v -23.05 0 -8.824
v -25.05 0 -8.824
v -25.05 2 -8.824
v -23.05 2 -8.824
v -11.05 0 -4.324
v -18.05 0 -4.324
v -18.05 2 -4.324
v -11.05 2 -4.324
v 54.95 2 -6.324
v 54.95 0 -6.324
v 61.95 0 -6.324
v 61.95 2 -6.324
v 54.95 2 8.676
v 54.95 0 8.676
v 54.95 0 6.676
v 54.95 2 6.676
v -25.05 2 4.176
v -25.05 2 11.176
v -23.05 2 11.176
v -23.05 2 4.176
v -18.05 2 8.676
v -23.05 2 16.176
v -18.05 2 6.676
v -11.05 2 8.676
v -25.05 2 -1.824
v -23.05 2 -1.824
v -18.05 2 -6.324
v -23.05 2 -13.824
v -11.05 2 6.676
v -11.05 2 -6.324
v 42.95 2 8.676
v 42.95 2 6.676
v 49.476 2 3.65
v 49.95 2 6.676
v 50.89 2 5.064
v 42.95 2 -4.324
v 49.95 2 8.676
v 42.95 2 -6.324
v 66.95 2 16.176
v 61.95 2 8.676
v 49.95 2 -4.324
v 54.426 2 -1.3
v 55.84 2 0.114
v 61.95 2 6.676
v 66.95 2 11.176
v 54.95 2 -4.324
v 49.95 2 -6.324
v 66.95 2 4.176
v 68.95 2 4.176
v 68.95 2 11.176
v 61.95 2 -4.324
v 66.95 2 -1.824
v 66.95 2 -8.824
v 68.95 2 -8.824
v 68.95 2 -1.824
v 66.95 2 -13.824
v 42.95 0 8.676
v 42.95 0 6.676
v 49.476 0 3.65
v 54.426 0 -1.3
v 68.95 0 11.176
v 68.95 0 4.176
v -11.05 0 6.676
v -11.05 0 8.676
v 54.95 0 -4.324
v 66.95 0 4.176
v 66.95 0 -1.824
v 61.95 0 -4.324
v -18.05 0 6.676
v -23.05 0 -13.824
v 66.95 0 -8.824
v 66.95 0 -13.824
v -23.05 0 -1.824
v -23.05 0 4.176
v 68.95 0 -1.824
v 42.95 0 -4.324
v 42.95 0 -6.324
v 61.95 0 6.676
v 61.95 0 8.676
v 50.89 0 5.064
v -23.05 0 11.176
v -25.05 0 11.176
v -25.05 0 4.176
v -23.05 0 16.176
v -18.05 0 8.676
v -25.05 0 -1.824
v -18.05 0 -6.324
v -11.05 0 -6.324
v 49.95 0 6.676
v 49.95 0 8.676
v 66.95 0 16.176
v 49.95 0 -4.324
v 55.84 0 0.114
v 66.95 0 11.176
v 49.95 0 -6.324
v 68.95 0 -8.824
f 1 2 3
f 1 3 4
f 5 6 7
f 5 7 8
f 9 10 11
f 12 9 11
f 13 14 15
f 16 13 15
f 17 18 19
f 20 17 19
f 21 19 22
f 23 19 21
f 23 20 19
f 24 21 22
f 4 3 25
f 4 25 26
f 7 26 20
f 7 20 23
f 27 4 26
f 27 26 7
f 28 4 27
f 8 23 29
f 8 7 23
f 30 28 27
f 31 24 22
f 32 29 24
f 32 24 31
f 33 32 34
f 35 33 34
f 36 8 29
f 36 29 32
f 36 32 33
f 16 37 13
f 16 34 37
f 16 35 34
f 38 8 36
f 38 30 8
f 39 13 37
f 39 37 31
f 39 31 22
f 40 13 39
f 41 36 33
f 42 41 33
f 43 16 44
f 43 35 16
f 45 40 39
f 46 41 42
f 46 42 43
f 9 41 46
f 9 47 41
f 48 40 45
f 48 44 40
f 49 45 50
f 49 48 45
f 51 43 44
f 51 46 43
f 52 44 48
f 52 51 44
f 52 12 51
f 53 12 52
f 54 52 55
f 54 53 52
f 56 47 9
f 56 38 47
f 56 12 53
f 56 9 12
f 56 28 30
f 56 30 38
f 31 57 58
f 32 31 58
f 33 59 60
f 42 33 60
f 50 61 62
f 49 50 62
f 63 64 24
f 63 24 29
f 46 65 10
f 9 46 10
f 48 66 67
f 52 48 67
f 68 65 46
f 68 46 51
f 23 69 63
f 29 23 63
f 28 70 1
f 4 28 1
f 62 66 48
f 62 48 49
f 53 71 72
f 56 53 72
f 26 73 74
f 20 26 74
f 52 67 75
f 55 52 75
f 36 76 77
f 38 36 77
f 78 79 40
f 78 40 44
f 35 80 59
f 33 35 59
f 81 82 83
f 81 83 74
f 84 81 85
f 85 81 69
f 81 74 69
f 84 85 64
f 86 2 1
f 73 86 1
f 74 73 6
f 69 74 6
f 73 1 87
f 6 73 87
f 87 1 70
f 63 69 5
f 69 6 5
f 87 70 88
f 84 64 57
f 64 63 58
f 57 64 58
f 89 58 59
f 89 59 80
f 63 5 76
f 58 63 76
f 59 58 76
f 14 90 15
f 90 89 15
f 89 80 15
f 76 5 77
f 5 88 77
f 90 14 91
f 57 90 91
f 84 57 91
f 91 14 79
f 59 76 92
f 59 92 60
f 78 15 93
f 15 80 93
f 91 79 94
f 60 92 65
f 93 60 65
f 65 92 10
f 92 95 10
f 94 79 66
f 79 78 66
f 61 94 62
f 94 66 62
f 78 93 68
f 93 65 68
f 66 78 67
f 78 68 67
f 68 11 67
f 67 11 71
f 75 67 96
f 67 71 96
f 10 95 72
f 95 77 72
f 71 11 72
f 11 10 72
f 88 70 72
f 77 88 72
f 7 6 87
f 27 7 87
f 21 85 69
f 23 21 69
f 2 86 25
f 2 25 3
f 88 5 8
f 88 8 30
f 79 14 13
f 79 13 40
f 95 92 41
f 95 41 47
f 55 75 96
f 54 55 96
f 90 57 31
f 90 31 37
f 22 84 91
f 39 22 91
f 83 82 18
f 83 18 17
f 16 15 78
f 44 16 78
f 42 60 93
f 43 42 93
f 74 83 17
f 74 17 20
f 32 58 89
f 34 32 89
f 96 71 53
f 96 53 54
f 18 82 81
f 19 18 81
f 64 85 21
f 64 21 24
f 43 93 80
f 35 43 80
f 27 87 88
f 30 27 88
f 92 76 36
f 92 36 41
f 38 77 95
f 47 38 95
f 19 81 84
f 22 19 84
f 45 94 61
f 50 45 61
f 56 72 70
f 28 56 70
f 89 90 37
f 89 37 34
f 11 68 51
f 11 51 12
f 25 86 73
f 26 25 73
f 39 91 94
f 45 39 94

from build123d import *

# Parameters (mm, degrees)
SKETCH1_W           = 2
SKETCH1_H           = 7
SKETCH1_W_2         = 7
SKETCH1_H_2         = 2
BOSS_EXTRUDE1_DEPTH = 2


with BuildPart() as part:
    # Sketch1 → Boss-Extrude1 (new body)
    # profile 1 of 6: a face of its own
    with BuildSketch(Plane(origin=(0, 0, 0), x_dir=(1, 0, 0), z_dir=(0, 1, 0))):
        with Locations((-24.050101389, 5.323848353)):
            Rectangle(SKETCH1_W, SKETCH1_H)
    # profile 2 of 6: a face of its own
    with BuildSketch(Plane(origin=(0, 0, 0), x_dir=(1, 0, 0), z_dir=(0, 1, 0))):
        with Locations((-24.050101389, -7.676151647)):
            Rectangle(SKETCH1_W, SKETCH1_H)
    # profile 3 of 6: a face of its own
    with BuildSketch(Plane(origin=(0, 0, 0), x_dir=(1, 0, 0), z_dir=(0, 1, 0))):
        Polygon((66.949898611, 13.823848353), (-23.050101389, 13.823848353), (-23.050101389, 8.823848353), (-23.050101389, 1.823848353), (-23.050101389, -4.176151647), (-23.050101389, -11.176151647), (-23.050101389, -16.176151647), (66.949898611, -16.176151647), (66.949898611, -11.176151647), (66.949898611, -4.176151647), (66.949898611, 1.823848353), (66.949898611, 8.823848353), align=None)
        with Locations((-14.550101389, -7.676151647)):
            Rectangle(SKETCH1_W_2, SKETCH1_H_2, mode=Mode.SUBTRACT)
        with Locations((46.449898611, -7.676151647)):
            Rectangle(SKETCH1_W_2, SKETCH1_H_2, mode=Mode.SUBTRACT)
        with Locations((58.449898611, -7.676151647)):
            Rectangle(SKETCH1_W_2, SKETCH1_H_2, mode=Mode.SUBTRACT)
        Polygon((54.425685048, 1.299905334), (55.839898611, -0.114308229), (50.890151142, -5.064055697), (49.47593758, -3.649842135), align=None, mode=Mode.SUBTRACT)
        with Locations((-14.550101389, 5.323848353)):
            Rectangle(SKETCH1_W_2, SKETCH1_H_2, mode=Mode.SUBTRACT)
        with Locations((46.449898611, 5.323848353)):
            Rectangle(SKETCH1_W_2, SKETCH1_H_2, mode=Mode.SUBTRACT)
        with Locations((58.449898611, 5.323848353)):
            Rectangle(SKETCH1_W_2, SKETCH1_H_2, mode=Mode.SUBTRACT)
    # profile 4 of 6: a face of its own
    with BuildSketch(Plane(origin=(0, 0, 0), x_dir=(1, 0, 0), z_dir=(0, 1, 0))):
        with Locations((67.949898611, 5.323848353)):
            Rectangle(SKETCH1_W, SKETCH1_H)
    # profile 5 of 6: a face of its own
    with BuildSketch(Plane(origin=(0, 0, 0), x_dir=(1, 0, 0), z_dir=(0, 1, 0))):
        with Locations((67.949898611, -7.676151647)):
            Rectangle(SKETCH1_W, SKETCH1_H)
    # profile 6 of 6: a face of its own
    with BuildSketch(Plane(origin=(0, 0, 0), x_dir=(1, 0, 0), z_dir=(0, 1, 0))):
        Polygon((66.949898611, 13.823848353), (-23.050101389, 13.823848353), (-23.050101389, 8.823848353), (-23.050101389, 1.823848353), (-23.050101389, -4.176151647), (-23.050101389, -11.176151647), (-23.050101389, -16.176151647), (66.949898611, -16.176151647), (66.949898611, -11.176151647), (66.949898611, -4.176151647), (66.949898611, 1.823848353), (66.949898611, 8.823848353), align=None)
        with Locations((-14.550101389, -7.676151647)):
            Rectangle(SKETCH1_W_2, SKETCH1_H_2, mode=Mode.SUBTRACT)
        with Locations((46.449898611, -7.676151647)):
            Rectangle(SKETCH1_W_2, SKETCH1_H_2, mode=Mode.SUBTRACT)
        with Locations((58.449898611, -7.676151647)):
            Rectangle(SKETCH1_W_2, SKETCH1_H_2, mode=Mode.SUBTRACT)
        Polygon((54.425685048, 1.299905334), (55.839898611, -0.114308229), (50.890151142, -5.064055697), (49.47593758, -3.649842135), align=None, mode=Mode.SUBTRACT)
        with Locations((-14.550101389, 5.323848353)):
            Rectangle(SKETCH1_W_2, SKETCH1_H_2, mode=Mode.SUBTRACT)
        with Locations((46.449898611, 5.323848353)):
            Rectangle(SKETCH1_W_2, SKETCH1_H_2, mode=Mode.SUBTRACT)
        with Locations((58.449898611, 5.323848353)):
            Rectangle(SKETCH1_W_2, SKETCH1_H_2, mode=Mode.SUBTRACT)
    extrude(amount=BOSS_EXTRUDE1_DEPTH)


solid = part.part
